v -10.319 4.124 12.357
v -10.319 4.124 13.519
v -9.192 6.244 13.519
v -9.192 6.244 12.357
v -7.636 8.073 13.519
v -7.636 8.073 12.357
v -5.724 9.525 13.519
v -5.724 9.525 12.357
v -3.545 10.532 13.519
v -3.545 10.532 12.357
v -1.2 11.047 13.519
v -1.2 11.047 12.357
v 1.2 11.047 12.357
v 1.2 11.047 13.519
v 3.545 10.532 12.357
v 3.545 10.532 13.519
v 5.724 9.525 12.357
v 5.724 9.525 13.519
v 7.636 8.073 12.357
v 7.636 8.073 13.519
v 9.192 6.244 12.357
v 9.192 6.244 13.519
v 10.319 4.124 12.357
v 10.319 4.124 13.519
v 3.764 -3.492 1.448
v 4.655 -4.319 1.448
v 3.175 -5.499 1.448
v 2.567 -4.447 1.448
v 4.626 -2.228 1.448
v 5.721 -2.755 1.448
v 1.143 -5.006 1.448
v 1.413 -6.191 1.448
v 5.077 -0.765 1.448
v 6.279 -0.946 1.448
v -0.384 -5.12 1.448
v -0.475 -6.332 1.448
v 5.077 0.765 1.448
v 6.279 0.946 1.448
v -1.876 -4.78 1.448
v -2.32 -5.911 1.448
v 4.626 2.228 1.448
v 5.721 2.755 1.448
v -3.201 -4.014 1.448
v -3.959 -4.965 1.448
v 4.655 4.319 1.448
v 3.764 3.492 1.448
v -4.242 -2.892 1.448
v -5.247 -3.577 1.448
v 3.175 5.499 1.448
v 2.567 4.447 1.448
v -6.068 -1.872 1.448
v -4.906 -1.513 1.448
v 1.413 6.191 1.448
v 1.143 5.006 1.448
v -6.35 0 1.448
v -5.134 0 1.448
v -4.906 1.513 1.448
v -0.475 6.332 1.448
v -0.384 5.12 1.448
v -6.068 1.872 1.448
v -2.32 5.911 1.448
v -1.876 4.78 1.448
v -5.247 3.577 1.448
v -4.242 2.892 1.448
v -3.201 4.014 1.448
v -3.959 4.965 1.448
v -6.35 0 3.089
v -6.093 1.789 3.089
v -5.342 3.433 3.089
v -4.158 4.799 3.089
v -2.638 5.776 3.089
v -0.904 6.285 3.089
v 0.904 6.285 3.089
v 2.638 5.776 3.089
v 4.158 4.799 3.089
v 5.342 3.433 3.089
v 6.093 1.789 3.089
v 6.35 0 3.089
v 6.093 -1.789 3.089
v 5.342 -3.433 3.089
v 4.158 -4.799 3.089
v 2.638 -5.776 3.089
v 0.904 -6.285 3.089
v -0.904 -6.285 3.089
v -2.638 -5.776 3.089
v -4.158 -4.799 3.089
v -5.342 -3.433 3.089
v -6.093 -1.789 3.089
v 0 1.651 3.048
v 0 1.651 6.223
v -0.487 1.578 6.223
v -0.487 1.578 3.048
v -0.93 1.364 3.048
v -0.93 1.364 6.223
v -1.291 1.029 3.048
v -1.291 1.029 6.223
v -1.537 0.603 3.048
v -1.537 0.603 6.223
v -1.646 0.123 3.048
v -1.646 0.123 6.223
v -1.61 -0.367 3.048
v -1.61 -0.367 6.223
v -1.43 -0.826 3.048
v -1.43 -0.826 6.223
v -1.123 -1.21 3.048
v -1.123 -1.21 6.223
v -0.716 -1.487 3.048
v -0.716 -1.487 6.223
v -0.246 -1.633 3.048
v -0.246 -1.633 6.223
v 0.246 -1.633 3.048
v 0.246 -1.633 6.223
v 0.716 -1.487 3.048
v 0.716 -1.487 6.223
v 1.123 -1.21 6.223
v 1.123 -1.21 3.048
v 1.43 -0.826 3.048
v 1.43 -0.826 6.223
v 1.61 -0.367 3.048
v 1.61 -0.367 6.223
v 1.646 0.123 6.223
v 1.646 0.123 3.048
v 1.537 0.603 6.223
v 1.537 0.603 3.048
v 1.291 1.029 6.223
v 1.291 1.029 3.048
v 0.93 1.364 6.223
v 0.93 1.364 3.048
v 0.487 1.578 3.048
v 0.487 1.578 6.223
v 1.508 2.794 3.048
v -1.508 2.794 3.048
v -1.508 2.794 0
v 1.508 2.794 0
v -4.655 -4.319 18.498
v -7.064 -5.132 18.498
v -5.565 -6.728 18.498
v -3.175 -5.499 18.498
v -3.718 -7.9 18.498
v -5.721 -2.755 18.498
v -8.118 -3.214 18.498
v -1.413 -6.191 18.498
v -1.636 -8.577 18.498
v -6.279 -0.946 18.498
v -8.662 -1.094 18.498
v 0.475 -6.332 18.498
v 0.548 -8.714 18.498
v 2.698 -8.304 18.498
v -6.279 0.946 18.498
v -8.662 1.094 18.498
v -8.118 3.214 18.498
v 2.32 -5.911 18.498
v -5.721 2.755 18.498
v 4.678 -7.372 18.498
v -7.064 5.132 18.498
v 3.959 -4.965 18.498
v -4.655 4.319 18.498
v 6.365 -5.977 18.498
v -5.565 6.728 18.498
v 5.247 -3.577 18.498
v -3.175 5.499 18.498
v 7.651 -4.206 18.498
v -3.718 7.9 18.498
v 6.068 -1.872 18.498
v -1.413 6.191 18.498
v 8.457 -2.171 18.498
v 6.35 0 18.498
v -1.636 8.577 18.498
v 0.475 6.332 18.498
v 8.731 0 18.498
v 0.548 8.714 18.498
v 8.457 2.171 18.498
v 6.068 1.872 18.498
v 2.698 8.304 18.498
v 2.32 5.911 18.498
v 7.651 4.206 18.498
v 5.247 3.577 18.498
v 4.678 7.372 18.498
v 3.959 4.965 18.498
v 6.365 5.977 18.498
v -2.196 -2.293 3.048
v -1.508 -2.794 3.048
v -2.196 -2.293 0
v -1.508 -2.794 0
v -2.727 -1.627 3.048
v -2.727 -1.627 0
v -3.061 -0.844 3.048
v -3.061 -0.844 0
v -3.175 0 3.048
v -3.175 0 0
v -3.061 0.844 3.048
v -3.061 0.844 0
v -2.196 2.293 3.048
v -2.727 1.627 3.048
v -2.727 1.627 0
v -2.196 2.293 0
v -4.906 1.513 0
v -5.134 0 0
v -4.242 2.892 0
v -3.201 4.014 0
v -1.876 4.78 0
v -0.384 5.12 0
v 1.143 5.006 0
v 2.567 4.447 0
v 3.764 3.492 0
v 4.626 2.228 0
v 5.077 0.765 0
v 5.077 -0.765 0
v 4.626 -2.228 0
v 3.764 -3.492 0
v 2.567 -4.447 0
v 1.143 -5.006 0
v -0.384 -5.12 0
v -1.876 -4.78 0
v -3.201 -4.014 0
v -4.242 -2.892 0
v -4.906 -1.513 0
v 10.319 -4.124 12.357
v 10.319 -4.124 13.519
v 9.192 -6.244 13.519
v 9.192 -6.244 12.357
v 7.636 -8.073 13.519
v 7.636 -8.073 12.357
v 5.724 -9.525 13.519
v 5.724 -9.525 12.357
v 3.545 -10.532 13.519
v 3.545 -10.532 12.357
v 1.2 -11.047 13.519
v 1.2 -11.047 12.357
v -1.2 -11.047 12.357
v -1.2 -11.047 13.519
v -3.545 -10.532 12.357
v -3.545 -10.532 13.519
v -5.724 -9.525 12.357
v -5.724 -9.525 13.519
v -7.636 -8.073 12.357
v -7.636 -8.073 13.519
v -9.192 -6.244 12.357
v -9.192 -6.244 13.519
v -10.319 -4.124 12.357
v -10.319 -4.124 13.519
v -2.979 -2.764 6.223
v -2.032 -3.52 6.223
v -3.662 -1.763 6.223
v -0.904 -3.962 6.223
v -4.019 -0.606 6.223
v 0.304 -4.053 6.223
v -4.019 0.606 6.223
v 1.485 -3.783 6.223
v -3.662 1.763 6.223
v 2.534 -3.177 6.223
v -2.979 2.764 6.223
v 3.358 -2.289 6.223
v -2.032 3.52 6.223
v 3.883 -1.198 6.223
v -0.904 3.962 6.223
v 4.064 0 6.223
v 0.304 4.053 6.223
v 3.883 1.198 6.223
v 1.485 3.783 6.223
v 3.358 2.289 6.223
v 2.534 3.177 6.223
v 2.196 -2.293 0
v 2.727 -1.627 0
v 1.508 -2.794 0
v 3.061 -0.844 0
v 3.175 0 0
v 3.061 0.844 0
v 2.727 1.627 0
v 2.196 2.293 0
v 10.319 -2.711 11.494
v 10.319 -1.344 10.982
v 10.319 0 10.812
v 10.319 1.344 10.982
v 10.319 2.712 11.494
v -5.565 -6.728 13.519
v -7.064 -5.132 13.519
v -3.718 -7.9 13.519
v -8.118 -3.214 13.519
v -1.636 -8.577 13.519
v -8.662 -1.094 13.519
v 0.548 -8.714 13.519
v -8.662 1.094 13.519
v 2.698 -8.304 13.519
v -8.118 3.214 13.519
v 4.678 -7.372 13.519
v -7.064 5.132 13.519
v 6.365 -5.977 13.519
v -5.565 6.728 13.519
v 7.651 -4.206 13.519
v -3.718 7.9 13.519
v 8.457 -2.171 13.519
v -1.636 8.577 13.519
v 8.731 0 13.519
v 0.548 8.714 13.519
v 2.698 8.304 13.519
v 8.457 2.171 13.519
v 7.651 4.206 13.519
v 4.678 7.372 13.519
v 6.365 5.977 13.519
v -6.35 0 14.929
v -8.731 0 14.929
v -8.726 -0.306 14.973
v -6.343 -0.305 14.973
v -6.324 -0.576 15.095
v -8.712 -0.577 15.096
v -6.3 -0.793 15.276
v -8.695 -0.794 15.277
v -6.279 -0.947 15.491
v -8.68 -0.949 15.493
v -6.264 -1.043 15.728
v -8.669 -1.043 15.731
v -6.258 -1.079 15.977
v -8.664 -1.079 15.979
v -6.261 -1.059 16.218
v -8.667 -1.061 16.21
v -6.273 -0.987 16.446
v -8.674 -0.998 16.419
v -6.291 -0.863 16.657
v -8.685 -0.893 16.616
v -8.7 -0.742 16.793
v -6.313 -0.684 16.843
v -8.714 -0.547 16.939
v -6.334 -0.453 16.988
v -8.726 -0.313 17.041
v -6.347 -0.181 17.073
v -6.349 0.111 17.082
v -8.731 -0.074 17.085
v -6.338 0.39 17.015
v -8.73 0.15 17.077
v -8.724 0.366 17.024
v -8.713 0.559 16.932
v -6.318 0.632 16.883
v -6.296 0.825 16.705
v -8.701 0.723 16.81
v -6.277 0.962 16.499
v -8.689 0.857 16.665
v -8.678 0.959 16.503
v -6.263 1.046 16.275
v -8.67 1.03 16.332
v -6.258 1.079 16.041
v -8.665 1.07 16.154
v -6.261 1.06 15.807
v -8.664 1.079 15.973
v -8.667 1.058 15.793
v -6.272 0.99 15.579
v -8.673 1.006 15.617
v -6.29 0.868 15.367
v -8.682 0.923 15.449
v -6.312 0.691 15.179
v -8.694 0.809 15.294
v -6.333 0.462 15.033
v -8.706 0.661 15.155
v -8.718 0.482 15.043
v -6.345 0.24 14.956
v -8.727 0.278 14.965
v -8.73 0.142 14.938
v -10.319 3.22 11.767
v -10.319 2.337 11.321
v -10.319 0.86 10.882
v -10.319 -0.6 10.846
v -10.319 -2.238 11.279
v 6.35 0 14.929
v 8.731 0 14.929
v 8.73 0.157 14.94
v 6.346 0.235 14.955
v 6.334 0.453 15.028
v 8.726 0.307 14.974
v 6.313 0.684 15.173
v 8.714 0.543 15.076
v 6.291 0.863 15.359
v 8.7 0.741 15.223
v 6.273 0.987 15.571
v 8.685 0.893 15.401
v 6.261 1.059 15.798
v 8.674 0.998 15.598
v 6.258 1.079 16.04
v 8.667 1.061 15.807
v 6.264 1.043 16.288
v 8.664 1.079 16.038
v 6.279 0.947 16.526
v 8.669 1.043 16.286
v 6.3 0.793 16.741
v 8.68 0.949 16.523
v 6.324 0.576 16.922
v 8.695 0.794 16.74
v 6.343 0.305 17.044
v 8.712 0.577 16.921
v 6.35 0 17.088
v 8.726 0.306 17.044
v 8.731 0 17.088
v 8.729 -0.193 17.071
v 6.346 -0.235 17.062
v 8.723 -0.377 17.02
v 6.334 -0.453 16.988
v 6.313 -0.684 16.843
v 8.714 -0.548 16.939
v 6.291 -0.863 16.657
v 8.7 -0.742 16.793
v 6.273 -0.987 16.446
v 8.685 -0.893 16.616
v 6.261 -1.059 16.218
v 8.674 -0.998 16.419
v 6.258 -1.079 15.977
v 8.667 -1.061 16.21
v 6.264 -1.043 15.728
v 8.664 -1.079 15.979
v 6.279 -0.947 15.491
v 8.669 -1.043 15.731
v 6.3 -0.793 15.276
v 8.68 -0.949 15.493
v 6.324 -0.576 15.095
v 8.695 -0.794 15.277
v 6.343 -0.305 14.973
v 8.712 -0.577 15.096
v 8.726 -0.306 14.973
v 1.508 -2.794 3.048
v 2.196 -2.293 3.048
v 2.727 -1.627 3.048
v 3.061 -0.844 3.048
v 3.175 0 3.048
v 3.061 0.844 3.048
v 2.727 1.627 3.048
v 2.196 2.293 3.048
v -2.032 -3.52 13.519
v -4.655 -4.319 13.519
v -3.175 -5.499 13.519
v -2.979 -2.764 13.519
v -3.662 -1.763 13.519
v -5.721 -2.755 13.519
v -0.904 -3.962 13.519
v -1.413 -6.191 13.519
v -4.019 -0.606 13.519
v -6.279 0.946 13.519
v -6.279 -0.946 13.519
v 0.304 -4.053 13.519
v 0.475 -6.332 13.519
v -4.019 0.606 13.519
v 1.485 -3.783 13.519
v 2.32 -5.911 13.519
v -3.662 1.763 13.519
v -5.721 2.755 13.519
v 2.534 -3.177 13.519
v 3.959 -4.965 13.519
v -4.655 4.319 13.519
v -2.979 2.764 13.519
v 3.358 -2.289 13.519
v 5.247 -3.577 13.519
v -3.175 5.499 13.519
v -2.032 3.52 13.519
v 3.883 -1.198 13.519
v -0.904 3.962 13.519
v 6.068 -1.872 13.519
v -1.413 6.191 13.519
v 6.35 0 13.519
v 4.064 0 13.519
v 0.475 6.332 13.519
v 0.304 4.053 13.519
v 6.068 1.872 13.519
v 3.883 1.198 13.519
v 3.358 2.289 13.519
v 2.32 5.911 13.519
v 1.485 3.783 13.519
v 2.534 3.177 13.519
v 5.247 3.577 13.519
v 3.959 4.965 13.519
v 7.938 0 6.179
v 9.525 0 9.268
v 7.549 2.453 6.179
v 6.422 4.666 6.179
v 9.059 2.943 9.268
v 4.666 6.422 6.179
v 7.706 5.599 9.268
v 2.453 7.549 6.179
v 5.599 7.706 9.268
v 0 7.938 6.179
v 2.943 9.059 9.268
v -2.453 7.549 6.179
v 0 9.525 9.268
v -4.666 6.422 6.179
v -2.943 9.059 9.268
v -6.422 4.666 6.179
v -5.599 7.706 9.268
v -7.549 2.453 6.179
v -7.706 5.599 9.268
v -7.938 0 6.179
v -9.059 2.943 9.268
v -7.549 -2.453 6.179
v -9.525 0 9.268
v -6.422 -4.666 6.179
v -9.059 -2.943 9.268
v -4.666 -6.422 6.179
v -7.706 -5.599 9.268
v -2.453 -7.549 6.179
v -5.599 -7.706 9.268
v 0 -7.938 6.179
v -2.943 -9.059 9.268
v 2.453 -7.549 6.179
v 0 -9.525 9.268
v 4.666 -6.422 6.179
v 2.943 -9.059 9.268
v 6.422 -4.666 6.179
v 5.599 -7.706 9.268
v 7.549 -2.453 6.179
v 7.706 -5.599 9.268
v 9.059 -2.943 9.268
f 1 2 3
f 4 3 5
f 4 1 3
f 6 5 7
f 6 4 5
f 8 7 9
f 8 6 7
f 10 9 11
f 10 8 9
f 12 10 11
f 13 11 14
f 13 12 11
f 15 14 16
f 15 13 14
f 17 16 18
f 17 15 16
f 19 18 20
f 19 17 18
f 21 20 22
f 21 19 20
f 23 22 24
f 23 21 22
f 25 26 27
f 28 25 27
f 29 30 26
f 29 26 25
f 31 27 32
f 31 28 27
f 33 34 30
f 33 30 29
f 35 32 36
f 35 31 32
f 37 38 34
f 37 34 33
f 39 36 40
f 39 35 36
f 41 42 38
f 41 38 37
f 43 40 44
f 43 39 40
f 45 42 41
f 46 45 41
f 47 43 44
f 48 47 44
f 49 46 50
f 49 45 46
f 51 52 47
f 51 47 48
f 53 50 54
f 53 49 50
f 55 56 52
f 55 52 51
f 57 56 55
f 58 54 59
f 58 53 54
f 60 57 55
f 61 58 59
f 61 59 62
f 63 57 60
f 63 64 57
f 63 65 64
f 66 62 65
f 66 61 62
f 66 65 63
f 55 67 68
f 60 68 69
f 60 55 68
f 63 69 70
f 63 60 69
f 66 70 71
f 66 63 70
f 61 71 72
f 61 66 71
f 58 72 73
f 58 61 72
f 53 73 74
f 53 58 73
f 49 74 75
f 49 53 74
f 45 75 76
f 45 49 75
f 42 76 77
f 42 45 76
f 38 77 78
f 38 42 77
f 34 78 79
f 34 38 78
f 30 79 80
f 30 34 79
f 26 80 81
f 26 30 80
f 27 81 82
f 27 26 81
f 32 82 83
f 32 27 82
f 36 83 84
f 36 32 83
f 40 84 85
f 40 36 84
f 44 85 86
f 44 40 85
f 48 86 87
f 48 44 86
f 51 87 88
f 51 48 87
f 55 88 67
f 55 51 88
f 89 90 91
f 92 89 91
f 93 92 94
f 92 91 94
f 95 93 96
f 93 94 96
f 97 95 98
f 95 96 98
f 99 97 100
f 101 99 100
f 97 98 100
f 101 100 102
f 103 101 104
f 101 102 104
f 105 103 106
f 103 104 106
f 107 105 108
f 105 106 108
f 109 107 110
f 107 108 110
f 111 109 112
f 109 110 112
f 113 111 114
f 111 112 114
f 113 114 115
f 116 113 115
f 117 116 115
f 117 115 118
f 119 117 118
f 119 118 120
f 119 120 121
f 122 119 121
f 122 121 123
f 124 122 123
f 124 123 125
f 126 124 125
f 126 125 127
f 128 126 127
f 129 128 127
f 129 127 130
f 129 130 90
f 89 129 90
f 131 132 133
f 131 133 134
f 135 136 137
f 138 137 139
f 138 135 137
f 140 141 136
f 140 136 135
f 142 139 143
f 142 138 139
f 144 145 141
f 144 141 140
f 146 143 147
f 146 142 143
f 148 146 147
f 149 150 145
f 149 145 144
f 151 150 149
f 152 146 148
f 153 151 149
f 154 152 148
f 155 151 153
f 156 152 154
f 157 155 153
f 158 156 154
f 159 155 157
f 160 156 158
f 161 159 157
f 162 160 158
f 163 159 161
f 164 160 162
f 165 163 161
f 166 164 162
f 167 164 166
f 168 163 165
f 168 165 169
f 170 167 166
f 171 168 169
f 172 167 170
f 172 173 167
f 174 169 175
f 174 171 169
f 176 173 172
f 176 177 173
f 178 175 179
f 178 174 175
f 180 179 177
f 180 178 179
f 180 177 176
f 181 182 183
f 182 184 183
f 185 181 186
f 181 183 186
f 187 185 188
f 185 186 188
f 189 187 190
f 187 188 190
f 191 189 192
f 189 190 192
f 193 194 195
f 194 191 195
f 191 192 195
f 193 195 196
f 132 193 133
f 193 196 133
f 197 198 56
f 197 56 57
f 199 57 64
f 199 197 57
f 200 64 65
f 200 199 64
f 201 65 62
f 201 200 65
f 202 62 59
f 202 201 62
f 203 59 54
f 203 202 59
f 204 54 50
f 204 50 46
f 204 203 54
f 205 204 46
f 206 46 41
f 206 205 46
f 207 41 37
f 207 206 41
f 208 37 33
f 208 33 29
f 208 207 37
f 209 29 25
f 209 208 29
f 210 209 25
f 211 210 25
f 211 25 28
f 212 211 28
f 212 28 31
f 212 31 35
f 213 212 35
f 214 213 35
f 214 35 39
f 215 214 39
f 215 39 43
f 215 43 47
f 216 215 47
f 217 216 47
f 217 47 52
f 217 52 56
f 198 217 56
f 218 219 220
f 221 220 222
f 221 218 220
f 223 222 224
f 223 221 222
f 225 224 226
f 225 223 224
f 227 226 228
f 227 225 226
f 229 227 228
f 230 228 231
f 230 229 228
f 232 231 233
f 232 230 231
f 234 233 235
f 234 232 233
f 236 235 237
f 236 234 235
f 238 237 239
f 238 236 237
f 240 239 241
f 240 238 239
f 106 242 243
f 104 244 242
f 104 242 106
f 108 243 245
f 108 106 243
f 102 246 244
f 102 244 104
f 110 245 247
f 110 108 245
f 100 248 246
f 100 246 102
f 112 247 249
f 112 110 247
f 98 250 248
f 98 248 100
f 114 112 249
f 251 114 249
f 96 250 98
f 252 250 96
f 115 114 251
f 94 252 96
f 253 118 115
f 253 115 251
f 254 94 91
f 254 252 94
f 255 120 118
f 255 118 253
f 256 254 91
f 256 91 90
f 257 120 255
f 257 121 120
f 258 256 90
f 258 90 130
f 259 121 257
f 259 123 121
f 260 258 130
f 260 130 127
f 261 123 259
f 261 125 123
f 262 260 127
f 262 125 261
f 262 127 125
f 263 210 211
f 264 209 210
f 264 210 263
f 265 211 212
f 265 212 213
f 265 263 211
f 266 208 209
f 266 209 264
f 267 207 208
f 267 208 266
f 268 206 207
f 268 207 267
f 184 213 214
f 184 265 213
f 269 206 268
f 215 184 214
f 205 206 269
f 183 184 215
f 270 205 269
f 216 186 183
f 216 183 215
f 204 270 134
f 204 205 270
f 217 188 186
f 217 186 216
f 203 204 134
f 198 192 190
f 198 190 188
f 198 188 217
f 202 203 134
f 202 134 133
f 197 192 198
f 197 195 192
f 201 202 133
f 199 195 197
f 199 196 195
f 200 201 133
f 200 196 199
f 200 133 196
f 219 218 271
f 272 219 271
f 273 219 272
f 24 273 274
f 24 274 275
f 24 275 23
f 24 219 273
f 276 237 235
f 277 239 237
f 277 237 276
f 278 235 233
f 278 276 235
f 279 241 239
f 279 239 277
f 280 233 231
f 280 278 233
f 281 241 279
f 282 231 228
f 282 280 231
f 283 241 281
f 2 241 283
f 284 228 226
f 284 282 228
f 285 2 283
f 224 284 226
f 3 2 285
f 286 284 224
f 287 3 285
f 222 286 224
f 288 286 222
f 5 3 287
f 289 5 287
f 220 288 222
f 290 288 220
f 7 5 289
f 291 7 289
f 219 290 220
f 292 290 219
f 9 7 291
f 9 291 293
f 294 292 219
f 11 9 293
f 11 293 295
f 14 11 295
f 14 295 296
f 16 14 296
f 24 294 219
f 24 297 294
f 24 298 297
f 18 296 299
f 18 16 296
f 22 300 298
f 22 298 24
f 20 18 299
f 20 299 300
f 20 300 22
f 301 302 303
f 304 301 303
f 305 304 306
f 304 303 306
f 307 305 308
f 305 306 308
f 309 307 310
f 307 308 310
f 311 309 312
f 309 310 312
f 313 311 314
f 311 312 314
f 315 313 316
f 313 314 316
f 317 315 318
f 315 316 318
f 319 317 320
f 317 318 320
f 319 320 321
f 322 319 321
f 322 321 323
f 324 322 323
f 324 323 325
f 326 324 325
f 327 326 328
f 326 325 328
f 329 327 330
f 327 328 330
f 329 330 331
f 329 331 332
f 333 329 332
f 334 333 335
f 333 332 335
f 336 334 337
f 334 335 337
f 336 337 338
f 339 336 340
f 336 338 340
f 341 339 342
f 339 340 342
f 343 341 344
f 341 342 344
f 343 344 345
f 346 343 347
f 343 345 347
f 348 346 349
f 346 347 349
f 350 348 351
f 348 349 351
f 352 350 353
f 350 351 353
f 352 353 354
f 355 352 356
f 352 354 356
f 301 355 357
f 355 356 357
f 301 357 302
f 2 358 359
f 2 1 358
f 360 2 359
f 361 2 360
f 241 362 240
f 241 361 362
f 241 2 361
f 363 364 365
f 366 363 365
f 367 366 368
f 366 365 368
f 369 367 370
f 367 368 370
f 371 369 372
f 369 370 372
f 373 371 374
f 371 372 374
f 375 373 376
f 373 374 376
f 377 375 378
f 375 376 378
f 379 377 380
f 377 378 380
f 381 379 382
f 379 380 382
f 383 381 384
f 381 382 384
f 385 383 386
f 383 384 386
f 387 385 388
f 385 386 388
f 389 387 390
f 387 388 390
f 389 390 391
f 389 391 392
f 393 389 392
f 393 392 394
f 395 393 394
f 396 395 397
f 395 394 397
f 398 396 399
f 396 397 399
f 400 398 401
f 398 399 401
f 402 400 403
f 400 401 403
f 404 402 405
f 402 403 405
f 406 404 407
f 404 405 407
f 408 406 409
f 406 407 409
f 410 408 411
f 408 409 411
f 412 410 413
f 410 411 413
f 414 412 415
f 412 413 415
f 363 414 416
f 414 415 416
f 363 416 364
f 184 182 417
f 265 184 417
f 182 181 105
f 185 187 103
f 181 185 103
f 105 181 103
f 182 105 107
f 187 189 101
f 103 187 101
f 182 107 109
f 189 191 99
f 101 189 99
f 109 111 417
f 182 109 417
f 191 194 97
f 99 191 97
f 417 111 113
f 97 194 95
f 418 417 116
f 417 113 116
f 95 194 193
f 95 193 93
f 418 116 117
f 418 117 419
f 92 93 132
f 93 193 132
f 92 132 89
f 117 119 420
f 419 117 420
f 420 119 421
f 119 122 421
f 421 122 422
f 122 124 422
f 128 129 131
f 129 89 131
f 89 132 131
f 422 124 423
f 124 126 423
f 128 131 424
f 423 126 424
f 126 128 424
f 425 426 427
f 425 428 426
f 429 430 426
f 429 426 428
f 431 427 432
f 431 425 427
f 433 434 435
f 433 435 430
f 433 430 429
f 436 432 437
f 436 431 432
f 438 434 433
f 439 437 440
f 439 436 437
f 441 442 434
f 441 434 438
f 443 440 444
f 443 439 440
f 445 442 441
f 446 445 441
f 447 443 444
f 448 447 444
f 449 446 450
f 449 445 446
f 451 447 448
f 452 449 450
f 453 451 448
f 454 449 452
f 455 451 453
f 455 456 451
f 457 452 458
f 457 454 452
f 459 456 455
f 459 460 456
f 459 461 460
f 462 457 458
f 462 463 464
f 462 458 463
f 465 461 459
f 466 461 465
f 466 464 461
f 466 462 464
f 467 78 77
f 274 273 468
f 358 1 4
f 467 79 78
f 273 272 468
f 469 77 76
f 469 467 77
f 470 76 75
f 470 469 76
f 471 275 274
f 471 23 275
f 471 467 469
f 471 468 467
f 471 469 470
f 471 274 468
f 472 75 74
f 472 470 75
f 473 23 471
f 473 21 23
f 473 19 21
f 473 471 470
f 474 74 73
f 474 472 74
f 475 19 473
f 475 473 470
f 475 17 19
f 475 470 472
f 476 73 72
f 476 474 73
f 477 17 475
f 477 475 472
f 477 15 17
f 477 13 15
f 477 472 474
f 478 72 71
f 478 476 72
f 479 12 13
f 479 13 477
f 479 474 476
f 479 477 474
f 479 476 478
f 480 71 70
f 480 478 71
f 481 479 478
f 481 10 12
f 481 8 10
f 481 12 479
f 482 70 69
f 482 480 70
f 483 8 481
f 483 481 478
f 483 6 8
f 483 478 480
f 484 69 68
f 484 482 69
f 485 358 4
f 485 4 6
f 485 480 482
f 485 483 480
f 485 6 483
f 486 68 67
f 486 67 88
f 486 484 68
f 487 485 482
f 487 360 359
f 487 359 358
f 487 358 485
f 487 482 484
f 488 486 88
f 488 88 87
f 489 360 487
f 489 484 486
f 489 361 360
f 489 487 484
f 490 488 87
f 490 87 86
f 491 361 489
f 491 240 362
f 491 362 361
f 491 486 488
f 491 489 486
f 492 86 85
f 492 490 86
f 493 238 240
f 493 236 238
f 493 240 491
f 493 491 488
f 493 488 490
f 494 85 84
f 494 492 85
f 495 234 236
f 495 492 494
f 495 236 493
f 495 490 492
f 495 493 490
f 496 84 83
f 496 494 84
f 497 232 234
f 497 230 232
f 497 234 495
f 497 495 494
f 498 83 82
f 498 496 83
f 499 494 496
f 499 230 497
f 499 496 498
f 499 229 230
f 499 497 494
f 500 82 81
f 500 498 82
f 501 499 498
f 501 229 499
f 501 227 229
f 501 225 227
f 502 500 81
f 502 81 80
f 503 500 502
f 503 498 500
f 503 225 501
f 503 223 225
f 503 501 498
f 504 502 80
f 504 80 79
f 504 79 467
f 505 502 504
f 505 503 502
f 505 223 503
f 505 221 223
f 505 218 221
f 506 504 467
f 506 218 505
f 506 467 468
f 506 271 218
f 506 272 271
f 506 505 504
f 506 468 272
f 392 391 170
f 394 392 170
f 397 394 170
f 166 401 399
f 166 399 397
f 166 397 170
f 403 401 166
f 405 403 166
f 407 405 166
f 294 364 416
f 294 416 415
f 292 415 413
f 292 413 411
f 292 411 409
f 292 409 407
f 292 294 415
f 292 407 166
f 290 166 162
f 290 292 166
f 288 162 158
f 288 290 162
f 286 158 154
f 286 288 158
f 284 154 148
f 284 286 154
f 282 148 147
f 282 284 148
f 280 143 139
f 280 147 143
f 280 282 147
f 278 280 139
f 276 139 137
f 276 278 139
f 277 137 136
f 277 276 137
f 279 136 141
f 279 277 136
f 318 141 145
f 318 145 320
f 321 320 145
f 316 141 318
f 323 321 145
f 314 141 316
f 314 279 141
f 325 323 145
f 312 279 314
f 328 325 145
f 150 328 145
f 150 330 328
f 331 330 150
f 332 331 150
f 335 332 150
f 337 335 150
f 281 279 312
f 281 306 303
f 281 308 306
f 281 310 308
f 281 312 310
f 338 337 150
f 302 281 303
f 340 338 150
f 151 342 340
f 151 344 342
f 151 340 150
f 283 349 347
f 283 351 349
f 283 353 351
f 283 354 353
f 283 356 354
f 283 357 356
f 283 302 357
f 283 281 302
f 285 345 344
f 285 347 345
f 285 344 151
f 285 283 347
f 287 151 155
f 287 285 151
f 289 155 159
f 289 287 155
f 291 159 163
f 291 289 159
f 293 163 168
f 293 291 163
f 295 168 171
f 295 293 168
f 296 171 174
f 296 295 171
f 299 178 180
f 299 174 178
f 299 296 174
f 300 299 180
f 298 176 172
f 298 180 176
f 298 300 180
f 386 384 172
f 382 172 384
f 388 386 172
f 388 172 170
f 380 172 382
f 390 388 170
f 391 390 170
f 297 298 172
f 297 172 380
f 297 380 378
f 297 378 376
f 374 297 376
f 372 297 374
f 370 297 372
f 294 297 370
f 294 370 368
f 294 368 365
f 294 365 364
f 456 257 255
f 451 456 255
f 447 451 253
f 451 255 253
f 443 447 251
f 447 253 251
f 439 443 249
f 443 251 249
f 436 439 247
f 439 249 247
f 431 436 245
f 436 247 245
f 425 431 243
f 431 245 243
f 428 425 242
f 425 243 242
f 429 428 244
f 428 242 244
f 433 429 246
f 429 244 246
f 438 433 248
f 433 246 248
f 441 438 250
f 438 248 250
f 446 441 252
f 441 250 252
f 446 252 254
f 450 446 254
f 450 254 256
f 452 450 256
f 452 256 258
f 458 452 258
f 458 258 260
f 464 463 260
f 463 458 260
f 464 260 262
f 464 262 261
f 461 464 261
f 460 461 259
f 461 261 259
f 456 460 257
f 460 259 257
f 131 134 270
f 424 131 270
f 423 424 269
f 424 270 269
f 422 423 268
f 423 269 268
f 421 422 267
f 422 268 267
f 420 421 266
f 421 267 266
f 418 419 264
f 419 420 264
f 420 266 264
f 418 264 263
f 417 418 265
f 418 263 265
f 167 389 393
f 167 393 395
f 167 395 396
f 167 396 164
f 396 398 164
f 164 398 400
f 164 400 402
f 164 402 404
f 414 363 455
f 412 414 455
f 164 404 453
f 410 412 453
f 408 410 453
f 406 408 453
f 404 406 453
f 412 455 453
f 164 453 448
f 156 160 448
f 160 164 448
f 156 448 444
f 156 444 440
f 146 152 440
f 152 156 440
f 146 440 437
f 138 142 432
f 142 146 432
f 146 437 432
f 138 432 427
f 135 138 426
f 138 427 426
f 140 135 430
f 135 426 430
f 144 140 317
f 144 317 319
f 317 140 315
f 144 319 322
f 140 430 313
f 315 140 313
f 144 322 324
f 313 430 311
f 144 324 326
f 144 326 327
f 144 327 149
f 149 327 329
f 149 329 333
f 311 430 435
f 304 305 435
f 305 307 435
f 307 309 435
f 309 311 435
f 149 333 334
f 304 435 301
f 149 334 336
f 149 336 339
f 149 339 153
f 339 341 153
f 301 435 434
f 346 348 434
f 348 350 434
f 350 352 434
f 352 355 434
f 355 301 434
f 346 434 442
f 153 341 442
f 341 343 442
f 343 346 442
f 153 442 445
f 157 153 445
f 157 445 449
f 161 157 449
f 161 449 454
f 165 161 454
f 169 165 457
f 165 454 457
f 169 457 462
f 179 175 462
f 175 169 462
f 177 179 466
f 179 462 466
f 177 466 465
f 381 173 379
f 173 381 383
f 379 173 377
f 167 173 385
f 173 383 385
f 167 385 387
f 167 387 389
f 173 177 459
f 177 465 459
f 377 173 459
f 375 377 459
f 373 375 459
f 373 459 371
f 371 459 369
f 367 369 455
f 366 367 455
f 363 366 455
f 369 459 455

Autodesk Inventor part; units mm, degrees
ref_plane "YZ Plane" through (0, 0, 0) normal (1, 0, 0) x (0, 1, 0)
ref_plane "XZ Plane" through (0, 0, 0) normal (0, 1, 0) x (-1, 0, 0)
sketch "Sketch1" plane through (0, 0, 0) normal (0, 0, 1) x (1, 0, 0)
  arc A0 (-1.508, 2.794) -> (-1.508, -2.794) centre (0, 0) ccw
  line L0 (-3.175, 0) -> (0, 0) construction
  line L1 (0, 0) -> (3.175, 0) construction
  line L2 (-1.508, 2.794) -> (1.508, 2.794)
  line L3 (-1.508, -2.794) -> (1.508, -2.794)
  arc A1 (1.508, 2.794) -> (-1.508, 2.794) centre (0, 0) ccw construction
  arc A2 (1.508, -2.794) -> (1.508, 2.794) centre (0, 0) ccw
  arc A3 (-1.508, -2.794) -> (1.508, -2.794) centre (0, 0) ccw construction
  circle A4 centre (0, 0) radius 3.429 construction
  circle A5 centre (0, 0) radius 4.064
  circle A6 centre (0, 0) radius 11.1125
  dimension "d1" = 2.794
  dimension "d2" = 3.175
  dimension "d3" = 6.858
  dimension "d5" = 0.635
  dimension "d6" = 22.225
extrude "Extrusion1" add sketch "Sketch1" along normal blind 3.048 contours A5 | A6
sketch "Sketch2" plane through (0, 0, 3.048) normal (0, 0, 1) x (1, 0, 0)
  circle A0 centre (0, 0) radius 11.1125 projected
  arc A1 (-1.508, 2.794) -> (-1.508, -2.794) centre (0, 0) ccw projected
extrude "Extrusion2" add sketch "Sketch2" along normal blind 3.175
hole "Hole1" at (0, 0, 3.048) direction (0, 0, 1) diameter 3.302 depth 25.4 tip angle 118 thread size "8-32 UNC" class "2B" standard "ANSI Unified Screw Threads"
sketch "Sketch3" plane through (0, 0, 6.223) normal (0, 0, 1) x (1, 0, 0)
  circle A0 centre (0, 0) radius 11.1125 projected
  circle A1 centre (0, 0) radius 3.429
  circle A2 centre (0, 0) radius 4.064
  dimension "d18" = 6.858
  dimension "d19" = 0.635
extrude "Extrusion3" add sketch "Sketch3" along normal blind 7.2961 contours A0
chamfer "Chamfer1" distance 6.35 distance2 12.3571 1 edges at (-11.1125, 0, 0) measured on face at (0.4465, -5.5398, 0)
sketch "Sketch6" plane through (0, 0, 13.5191) normal (0, 0, 1) x (1, 0, 0)
  circle A0 centre (0, 0) radius 11.1125 projected
  circle A1 centre (0, 0) radius 6.35
  circle A2 centre (0, 0) radius 8.7312
  dimension "d38" = 12.7
  dimension "d52" = 2.3813
  dimension "d53" = 2.3813
extrude "Extrusion5" add sketch "Sketch6" along normal blind 4.9784 contours A2
sketch "Sketch7" plane through (0, 0, 0) normal (1, 0, 0) x (0, 1, 0)
  line L0 (-6.35, 18.4975) -> (6.35, 18.4975) projected
  line L1 (6.35, 13.5191) -> (-6.35, 13.5191) projected
  line L2 (0, 0) -> (0, 13.5191) construction
  line L3 (0, 13.5191) -> (0, 18.4975) construction
  point P0 (0, 16.0084)
hole "Hole3" at (0, 0, 16.0084) direction (-1, 0, 0) diameter 2.159 end through all
sketch "Sketch8" plane through (0, 0, 13.5191) normal (0, 0, 1) x (1, 0, 0)
  circle A0 centre (0, 0) radius 11.1125 projected
  circle A1 centre (0, 0) radius 8.7312 projected
  line L0 (-10.3187, 4.1244) -> (-10.3188, -4.1244)
  line L1 (-11.1125, 0) -> (0, 0)
  dimension "d49" = 0.7937
extrude "Extrusion6" cut sketch "Sketch8" against normal through all contours L0 L1 A0 | A0 L1 L0
mirror "Mirror2" about plane through (0, 0, 0) normal (1, 0, 0) of "Hole3", "Extrusion6"
ref_plane "Work Plane3" through (0, 0, 1.4478) normal (0, 0, -1) x (-1, 0, 0)
sketch "Sketch12" plane through (0, 0, 1.4478) normal (0, 0, -1) x (-1, 0, 0)
  circle A0 centre (0, 0) radius 6.35
  circle A1 centre (0, 0) radius 5.0165
  dimension "d60" = 12.7
  dimension "d61" = 10.033
extrude "Extrusion9" add sketch "Sketch12" against normal blind 2.54
sketch "Sketch13" plane through (0, 0, 0) normal (0, 0, -1) x (-1, 0, 0)
  circle A0 centre (0, 0) radius 4.7625 projected
  circle A1 centre (0, 0) radius 5.5065 projected
  circle A2 centre (0, 0) radius 5.1345
  dimension "d64" = 0.372
  dimension "d65" = 0.372
extrude "Extrusion10" cut sketch "Sketch13" against normal up to surface (1.4478 mm away) contours A1
extrude "Extrusion11" add sketch "Sketch13" against normal up to surface (1.4478 mm away) contours A2
equation "\"d52\" = d53"
equation "\"d64\" = d65"
properties part number "Pneumatic Connector -Actuator Side"
